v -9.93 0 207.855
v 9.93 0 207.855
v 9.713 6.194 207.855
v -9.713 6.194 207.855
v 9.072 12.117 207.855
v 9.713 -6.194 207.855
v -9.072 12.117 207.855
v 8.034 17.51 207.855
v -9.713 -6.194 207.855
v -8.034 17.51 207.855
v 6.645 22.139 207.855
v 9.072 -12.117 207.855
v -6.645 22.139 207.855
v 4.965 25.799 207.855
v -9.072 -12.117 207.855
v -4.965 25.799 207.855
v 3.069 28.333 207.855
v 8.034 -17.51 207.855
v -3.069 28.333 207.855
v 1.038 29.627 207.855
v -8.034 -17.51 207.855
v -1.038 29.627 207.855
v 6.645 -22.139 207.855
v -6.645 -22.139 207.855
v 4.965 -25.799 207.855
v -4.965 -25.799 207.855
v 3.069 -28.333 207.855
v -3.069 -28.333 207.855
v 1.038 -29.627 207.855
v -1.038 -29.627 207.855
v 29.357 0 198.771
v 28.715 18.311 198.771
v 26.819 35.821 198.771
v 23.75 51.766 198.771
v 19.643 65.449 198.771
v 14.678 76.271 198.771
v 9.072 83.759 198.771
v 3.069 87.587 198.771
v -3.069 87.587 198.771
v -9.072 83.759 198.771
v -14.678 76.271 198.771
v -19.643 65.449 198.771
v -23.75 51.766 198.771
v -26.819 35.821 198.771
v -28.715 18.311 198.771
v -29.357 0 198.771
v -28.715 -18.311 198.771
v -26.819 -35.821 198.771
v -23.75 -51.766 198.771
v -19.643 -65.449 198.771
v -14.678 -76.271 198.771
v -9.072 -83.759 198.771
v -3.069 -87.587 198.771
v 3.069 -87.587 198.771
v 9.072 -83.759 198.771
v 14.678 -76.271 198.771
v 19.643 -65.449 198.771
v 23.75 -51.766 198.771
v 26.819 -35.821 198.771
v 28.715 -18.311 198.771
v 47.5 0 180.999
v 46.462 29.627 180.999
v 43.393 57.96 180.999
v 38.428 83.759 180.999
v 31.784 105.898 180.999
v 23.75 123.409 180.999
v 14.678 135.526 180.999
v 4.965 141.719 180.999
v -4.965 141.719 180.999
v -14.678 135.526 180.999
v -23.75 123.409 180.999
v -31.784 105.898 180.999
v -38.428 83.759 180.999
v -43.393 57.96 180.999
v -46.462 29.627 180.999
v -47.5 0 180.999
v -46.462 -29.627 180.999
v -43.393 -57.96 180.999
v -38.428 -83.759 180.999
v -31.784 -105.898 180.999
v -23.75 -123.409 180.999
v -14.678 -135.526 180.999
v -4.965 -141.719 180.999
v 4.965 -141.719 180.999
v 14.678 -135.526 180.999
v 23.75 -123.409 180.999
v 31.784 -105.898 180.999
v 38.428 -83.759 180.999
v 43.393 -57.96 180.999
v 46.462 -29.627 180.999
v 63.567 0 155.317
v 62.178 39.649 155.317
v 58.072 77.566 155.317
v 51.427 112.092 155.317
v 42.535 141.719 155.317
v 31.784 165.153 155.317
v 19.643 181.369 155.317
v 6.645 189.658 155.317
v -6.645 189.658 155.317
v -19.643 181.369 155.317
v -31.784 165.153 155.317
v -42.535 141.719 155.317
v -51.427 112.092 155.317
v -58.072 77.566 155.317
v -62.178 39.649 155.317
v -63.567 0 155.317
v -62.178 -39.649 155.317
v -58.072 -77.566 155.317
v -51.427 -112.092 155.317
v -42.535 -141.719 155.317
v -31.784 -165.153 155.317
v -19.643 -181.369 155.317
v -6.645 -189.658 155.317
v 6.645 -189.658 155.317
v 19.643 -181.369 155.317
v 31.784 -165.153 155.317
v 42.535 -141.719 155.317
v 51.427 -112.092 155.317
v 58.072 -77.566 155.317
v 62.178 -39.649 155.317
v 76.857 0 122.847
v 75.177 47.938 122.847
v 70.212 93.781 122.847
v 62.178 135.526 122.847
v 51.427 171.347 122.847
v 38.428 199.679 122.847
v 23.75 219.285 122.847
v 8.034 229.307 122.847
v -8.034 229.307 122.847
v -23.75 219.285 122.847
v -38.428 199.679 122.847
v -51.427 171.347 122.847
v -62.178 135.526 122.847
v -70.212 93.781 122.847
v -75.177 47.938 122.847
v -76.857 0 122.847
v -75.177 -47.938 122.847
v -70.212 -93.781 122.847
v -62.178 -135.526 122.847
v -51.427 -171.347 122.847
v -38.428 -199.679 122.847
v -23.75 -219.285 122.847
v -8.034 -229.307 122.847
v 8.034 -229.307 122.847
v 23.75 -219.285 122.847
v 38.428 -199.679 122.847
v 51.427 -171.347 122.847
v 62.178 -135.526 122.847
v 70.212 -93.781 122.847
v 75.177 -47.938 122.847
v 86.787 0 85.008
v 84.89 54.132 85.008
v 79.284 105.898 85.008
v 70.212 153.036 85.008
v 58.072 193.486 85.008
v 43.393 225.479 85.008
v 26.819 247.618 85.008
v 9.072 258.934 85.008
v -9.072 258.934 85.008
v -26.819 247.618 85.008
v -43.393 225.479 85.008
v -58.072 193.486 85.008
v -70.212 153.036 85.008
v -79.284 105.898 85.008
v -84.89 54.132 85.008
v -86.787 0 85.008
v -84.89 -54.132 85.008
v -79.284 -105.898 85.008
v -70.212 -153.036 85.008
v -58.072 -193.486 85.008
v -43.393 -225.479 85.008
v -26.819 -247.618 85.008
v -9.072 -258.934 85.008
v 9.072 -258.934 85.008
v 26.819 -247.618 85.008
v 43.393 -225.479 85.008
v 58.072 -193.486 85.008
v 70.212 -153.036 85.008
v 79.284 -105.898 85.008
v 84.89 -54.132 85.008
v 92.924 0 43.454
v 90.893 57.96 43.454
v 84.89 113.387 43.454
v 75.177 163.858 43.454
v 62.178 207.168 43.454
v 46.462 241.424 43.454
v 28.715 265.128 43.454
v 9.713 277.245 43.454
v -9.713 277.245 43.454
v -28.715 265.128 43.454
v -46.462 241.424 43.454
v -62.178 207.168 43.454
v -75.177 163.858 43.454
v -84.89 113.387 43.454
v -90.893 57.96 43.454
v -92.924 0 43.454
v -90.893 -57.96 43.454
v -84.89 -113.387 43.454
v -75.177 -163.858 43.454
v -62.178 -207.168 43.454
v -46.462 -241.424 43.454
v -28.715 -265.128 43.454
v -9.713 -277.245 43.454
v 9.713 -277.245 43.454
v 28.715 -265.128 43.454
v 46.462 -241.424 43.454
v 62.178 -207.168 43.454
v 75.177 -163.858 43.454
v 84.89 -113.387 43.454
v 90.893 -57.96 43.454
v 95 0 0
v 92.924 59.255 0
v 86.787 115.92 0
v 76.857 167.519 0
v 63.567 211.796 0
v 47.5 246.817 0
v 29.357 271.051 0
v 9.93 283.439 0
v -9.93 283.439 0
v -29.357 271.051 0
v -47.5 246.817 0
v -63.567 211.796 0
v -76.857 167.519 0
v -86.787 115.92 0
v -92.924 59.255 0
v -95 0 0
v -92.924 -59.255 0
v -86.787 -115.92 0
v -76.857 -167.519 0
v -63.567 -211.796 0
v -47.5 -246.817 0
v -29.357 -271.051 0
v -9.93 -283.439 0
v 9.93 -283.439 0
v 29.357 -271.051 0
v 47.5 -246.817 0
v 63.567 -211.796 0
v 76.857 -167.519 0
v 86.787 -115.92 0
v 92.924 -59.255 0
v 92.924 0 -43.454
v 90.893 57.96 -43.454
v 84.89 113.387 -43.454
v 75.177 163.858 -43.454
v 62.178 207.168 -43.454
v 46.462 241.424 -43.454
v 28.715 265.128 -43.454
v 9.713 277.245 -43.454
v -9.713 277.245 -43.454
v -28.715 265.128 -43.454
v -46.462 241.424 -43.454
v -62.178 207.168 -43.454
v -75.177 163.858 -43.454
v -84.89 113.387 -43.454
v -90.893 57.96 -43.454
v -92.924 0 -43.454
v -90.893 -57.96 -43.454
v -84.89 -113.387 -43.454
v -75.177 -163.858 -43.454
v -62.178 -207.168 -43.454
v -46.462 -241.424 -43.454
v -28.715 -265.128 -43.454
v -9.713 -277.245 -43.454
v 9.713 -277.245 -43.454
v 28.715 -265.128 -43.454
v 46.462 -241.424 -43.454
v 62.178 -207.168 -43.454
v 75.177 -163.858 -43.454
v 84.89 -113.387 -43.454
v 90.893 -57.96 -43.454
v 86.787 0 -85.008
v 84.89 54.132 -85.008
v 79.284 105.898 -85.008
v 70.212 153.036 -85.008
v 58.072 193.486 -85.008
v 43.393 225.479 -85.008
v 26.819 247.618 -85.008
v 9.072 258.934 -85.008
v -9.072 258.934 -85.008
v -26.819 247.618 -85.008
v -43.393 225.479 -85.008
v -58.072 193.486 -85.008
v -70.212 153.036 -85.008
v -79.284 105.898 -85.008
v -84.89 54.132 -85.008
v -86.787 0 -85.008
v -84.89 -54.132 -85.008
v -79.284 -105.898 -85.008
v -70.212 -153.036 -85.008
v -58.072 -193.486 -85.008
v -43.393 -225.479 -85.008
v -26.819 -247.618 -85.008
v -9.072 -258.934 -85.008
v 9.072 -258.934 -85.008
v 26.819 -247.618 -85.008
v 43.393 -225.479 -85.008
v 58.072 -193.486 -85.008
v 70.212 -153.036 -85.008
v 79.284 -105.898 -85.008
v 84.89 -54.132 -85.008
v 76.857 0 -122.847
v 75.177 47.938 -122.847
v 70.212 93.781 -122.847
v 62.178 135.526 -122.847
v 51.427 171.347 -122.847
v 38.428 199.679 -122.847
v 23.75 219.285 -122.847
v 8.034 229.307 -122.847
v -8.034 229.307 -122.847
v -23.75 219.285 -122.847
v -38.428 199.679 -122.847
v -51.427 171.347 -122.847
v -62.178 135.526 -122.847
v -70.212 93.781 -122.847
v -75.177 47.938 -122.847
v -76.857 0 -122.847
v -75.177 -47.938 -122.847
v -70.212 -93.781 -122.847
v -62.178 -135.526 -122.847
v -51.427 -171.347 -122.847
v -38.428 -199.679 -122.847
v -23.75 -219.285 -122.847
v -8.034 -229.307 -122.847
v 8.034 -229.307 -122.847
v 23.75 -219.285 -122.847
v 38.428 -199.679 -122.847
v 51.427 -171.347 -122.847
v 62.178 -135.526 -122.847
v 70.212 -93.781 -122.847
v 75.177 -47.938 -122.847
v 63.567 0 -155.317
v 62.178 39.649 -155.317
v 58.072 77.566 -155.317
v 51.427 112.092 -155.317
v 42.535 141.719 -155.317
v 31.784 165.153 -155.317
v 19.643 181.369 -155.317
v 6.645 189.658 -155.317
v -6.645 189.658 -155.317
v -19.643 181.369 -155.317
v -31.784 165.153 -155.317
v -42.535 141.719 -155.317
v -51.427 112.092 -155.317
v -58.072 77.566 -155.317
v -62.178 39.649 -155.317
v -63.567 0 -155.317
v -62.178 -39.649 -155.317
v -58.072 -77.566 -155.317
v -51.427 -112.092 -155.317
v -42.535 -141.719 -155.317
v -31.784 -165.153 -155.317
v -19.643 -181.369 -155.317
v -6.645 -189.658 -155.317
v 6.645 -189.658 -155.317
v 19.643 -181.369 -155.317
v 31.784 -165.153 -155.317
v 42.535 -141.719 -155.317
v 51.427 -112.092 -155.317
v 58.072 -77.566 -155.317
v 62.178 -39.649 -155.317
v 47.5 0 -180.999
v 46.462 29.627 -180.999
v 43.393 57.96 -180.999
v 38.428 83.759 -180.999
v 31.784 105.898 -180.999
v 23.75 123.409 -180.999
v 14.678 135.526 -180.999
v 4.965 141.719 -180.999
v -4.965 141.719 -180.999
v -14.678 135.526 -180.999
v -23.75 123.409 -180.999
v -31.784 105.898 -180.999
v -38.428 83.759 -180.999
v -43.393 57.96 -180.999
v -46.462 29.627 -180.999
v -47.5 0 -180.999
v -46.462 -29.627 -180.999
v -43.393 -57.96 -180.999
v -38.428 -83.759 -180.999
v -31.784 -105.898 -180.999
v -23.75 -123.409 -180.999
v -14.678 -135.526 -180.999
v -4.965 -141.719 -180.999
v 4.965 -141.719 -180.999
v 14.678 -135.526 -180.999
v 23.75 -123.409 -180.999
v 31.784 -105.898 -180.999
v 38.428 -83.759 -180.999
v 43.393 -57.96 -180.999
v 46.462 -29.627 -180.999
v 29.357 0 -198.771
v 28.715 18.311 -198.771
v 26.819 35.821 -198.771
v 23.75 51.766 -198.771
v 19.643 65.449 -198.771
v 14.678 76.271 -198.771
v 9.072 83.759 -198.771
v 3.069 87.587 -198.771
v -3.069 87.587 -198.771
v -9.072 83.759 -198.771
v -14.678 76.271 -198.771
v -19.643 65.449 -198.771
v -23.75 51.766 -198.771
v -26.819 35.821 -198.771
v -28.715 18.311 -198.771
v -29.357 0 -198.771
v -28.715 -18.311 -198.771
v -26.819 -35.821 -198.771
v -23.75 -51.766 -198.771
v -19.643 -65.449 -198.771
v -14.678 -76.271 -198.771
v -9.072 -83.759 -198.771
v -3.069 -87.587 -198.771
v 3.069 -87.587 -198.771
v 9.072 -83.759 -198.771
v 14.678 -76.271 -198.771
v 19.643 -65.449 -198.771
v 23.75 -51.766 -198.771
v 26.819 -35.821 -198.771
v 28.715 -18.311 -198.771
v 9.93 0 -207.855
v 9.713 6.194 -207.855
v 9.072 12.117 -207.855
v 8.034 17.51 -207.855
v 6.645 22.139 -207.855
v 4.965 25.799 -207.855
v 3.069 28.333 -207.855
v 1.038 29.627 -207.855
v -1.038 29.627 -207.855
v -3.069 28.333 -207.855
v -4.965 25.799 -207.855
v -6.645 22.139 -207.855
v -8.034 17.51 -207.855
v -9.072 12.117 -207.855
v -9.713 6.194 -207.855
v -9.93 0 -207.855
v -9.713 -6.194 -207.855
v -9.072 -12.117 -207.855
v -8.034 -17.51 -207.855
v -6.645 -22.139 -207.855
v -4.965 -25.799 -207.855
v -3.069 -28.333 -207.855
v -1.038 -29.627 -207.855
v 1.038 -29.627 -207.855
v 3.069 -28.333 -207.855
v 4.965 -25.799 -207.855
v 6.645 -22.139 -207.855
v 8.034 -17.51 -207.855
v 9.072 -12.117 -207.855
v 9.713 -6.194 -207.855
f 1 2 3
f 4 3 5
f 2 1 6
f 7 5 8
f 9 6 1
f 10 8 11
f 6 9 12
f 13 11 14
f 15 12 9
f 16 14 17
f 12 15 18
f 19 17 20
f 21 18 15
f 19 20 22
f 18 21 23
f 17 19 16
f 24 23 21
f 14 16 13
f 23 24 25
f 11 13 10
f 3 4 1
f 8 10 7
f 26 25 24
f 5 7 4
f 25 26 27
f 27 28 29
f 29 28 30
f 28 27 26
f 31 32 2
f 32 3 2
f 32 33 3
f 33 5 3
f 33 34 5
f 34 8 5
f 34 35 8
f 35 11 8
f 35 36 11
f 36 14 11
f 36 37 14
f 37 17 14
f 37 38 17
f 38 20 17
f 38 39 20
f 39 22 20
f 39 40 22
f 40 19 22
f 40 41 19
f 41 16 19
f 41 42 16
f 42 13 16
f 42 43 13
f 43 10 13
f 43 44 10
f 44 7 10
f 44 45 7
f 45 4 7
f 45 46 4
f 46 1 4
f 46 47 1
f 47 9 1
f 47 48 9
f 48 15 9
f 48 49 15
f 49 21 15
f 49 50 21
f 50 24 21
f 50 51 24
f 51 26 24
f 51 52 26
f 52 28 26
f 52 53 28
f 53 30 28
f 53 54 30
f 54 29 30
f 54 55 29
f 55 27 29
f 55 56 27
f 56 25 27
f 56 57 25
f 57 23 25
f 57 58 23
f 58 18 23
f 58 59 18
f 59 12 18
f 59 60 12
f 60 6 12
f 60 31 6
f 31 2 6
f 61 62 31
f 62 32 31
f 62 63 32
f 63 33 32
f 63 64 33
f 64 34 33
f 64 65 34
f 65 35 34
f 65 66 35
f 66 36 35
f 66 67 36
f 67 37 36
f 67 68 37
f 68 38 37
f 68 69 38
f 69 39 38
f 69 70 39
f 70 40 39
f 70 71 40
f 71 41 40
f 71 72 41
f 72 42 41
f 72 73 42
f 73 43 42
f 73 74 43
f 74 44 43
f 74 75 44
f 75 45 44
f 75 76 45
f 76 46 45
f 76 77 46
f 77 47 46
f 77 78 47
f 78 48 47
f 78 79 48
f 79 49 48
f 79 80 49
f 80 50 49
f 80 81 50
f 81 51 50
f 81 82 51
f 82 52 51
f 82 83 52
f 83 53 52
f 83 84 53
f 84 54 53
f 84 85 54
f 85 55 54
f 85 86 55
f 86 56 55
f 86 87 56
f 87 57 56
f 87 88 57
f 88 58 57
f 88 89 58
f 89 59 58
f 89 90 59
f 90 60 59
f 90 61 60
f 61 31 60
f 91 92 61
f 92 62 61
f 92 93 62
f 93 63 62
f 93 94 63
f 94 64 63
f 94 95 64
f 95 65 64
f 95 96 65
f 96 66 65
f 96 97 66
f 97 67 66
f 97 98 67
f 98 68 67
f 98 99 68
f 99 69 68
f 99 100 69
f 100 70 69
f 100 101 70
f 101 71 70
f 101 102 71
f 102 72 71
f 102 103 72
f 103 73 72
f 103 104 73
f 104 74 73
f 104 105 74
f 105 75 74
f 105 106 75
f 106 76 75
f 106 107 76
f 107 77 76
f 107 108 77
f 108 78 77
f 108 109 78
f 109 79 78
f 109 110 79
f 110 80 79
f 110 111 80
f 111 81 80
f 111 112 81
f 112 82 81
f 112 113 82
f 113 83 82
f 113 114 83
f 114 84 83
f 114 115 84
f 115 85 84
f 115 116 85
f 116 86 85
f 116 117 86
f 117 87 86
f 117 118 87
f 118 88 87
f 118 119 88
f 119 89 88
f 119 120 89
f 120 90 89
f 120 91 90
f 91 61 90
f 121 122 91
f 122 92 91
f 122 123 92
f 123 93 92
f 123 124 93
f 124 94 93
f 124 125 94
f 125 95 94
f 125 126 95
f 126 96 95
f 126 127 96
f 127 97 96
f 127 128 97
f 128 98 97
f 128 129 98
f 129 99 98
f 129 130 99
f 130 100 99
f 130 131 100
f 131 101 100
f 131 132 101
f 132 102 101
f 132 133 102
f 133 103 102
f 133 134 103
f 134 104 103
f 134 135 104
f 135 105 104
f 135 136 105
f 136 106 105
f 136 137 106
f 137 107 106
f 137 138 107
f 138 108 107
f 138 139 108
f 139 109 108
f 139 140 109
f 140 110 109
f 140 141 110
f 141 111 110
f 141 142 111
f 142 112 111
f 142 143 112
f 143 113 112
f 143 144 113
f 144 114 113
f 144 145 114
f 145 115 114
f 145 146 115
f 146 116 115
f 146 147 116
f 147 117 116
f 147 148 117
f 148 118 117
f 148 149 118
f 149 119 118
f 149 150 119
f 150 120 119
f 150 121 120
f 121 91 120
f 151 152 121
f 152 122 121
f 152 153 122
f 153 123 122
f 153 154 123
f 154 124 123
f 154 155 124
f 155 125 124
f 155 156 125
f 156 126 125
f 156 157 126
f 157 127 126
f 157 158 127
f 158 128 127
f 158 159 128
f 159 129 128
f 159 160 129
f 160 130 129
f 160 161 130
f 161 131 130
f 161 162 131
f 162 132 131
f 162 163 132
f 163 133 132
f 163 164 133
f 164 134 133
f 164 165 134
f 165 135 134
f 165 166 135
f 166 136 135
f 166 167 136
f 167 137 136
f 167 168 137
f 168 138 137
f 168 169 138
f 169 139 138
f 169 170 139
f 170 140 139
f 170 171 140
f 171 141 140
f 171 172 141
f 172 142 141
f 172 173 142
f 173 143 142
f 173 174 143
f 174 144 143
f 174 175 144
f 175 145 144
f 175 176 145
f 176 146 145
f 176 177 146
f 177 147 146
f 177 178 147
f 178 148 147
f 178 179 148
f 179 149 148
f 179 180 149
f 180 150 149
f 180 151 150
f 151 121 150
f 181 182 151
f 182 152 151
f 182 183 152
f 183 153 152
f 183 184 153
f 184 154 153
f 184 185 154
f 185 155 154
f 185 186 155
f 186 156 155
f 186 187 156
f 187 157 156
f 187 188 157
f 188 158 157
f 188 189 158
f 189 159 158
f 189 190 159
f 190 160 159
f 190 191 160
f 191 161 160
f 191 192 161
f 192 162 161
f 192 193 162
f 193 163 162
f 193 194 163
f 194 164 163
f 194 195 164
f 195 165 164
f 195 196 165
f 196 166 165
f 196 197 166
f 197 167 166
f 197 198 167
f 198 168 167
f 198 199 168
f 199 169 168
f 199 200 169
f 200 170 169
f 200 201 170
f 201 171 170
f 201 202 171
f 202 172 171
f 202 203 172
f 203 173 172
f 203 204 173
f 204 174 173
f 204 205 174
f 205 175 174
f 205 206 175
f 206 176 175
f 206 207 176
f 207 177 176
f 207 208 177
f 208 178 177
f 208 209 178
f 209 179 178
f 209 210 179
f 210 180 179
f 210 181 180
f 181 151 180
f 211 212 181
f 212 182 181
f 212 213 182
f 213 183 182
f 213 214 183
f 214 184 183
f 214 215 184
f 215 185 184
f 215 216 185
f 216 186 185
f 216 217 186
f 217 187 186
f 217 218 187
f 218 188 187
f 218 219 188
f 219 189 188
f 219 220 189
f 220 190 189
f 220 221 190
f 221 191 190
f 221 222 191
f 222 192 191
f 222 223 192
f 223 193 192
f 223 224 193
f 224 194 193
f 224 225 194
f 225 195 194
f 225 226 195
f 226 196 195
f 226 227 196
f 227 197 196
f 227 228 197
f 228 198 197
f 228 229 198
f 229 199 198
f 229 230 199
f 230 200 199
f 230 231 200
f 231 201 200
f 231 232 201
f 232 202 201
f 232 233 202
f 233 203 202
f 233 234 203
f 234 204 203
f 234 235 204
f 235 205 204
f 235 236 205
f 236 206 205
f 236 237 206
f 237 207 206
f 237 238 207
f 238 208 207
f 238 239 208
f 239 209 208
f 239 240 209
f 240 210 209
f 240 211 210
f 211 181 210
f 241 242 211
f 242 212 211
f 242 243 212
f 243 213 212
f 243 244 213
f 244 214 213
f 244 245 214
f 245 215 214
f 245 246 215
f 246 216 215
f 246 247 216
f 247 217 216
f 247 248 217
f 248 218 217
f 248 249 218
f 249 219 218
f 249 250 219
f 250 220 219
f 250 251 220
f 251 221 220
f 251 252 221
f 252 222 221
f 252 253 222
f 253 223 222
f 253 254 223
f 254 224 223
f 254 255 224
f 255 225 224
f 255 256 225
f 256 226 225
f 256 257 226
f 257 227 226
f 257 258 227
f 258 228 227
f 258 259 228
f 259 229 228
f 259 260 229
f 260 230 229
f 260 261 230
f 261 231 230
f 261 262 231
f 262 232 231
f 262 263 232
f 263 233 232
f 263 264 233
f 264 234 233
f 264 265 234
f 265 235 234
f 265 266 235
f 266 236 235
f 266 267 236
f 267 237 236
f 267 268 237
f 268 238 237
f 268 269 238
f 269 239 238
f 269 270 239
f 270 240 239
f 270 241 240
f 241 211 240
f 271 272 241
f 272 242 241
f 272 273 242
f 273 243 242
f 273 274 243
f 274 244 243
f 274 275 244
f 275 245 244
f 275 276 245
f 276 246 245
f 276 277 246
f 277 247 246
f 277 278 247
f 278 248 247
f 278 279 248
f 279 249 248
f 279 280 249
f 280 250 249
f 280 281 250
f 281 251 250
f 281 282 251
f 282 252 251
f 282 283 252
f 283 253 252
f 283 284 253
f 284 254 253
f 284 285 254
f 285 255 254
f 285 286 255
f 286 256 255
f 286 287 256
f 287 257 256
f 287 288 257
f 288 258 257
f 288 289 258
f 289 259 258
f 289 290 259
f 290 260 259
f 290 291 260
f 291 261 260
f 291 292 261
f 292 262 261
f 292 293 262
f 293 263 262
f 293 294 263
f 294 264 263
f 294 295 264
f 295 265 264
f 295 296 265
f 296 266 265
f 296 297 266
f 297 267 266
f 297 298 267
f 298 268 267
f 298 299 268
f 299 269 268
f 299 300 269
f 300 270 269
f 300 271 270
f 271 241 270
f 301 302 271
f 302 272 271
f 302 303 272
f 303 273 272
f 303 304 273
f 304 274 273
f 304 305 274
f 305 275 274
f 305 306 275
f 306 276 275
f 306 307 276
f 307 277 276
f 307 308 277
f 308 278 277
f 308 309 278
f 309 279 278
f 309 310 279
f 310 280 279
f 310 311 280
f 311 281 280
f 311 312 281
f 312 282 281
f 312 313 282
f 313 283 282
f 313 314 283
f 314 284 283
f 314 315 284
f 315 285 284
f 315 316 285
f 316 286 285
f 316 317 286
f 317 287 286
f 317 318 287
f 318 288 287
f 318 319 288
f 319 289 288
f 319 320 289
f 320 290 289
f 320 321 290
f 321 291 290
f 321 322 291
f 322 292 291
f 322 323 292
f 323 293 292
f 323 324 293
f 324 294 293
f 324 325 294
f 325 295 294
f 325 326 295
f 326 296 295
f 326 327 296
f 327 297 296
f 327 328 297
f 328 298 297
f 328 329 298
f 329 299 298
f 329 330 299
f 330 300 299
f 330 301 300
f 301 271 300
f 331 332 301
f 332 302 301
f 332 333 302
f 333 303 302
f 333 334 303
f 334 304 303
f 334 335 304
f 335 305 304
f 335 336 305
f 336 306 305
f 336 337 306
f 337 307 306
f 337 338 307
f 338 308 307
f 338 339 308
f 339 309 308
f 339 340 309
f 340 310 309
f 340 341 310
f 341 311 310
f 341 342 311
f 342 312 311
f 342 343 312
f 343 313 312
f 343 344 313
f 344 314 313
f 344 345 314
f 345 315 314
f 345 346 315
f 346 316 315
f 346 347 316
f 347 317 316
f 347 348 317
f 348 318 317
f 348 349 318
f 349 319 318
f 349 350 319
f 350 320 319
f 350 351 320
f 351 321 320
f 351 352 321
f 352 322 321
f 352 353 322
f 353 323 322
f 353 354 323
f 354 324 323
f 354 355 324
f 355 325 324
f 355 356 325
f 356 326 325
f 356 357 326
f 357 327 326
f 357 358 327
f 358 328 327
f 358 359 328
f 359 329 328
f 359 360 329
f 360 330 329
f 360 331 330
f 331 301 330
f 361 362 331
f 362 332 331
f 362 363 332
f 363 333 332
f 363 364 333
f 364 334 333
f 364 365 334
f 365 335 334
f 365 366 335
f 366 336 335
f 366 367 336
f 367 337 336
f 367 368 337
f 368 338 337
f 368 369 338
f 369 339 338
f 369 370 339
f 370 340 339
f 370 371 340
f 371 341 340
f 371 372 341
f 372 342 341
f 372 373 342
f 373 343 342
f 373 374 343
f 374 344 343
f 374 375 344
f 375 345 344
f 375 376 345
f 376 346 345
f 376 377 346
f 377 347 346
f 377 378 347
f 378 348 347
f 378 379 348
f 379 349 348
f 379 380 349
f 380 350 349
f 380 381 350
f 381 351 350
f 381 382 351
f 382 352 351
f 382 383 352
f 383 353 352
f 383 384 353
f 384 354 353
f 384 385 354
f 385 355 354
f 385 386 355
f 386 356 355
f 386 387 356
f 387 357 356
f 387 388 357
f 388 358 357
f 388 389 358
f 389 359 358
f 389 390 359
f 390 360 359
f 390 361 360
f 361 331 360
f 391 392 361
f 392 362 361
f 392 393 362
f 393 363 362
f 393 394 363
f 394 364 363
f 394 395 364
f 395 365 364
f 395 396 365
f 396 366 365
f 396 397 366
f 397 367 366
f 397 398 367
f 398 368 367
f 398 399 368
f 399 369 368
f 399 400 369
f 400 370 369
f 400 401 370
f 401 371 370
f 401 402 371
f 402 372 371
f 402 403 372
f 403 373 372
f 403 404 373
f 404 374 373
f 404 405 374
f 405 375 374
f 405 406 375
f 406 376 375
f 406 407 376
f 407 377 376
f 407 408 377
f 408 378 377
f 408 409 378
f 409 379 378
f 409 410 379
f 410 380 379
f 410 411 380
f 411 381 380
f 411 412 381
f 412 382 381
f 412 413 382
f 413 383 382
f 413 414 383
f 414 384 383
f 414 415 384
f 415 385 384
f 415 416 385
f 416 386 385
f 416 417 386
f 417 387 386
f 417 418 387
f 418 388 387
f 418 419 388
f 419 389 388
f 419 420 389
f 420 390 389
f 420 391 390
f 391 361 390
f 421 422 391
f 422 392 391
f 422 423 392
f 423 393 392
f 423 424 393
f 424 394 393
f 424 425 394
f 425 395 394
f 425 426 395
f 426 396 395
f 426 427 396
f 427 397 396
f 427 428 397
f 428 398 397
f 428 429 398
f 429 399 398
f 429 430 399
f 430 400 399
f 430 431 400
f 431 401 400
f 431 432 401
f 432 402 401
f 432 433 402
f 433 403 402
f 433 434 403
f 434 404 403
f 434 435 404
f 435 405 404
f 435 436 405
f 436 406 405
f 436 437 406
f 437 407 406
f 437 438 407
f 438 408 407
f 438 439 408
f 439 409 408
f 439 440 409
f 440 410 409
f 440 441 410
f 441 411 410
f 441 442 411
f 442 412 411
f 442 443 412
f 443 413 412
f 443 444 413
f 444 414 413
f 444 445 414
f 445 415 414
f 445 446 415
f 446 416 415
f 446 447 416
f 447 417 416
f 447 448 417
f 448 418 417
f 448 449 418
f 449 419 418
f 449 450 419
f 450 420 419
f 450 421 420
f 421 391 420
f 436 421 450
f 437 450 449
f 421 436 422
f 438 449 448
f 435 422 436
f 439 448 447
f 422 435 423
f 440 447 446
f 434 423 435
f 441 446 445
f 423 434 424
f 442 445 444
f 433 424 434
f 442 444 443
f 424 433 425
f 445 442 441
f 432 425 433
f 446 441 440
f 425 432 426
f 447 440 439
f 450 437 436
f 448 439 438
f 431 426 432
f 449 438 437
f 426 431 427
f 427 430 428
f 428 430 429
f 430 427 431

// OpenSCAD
// Generated by SolidPython 1.0.1 on 2020-07-29 00:46:46


scale(v = [5, 15, 11]) {
	sphere(r = 19);
}
/***********************************************
*********      SolidPython code:      **********
************************************************
 
# import packages: SolidPython
from solid import *
from solid.utils import *
from itertools import chain, combinations, permutations


class Resize:

    def __init__(self, scad_file):
        self.scad_file = scad_file
        #self.scad_file = import_scad(scad_file)
        # cone/cylinder param:
        self.r1 = 0
        self.r2 = 0
        self.h = 0
        # rectangular prism param:
        self.w = 0
        self.l = 0
        # ellipse param:
        self.r = 0

    # import OpenScad code (file name corresponds to shape)


    # classify shape + parameters
    def assign(self, param1, param2, param3):
        if self.scad_file == 'cone.scad':
            self.r1 = param1
            self.r2 = param2
            self.h = param3
        elif self.scad_file == 'cylinder.scad':
            self.r1 = param1
            self.r2 = param2
            self.h = param3
        elif self.scad_file == 'rectangularPrism.scad':
            self.h = param1
            self.l = param2
            self.w = param3
        else:
            self.r = param1
            self.h = param2

    # resize parameters
    def iterate(self):
        x = range(3, 20, 2)
        i = 1
        if self.scad_file == 'cone.scad':
            tempList = list(permutations(x, 2))
            for temp in tempList:
                param1 = temp[0]
                param2 = temp[1]
                filepath = 'produced_scad_files/' + 'cone' + str(param1) + '_' + str(param2) + '_' + '.scad'
                scad_render_to_file(cylinder(h=param1, r1=param2, r2=0), filepath)

        elif self.scad_file == 'cylinder.scad':
            tempList = list(permutations(x, 3))
            for temp in tempList:
                param1 = temp[0]
                param2 = temp[1]
                filepath = 'produced_scad_files/' + 'cylinder' + str(param1) + '_' + str(param2) + '_' + '.scad'
                scad_render_to_file(cylinder(h=param1, r1=param2, r2=param2), filepath)

        elif self.scad_file == 'rectangularPrism.scad':
            tempList = list(permutations(x, 3))
            for temp in tempList:
                param1 = temp[0]
                param2 = temp[1]
                param3 = temp[2]
                filepath = 'produced_scad_files/' + 'rectangularPrism' + str(param1) + '_' + str(param2) + '_' + str(
                    param3) + '.scad'
                scad_render_to_file(cube(size=(param1, param2, param3)), filepath)

        elif self.scad_file == 'ellipse.scad':
            tempList = list(permutations(x, 4))
            for temp in tempList:
                param1 = temp[0]
                param2 = temp[1]
                param3 = temp[2]
                param4 = temp[3]
                filepath = 'produced_scad_files/' + 'ellipse' + str(param1) + '_' + str(param2) + '_' + str(param3) + '_' + str(param4) + '.scad'
                scad_render_to_file(scale([param1, param2, param3])(sphere(r=param4)), filepath)

    def render_to_scadfile(self):
        scad_render_to_file(scad, 'example.scad') 
 
************************************************/
